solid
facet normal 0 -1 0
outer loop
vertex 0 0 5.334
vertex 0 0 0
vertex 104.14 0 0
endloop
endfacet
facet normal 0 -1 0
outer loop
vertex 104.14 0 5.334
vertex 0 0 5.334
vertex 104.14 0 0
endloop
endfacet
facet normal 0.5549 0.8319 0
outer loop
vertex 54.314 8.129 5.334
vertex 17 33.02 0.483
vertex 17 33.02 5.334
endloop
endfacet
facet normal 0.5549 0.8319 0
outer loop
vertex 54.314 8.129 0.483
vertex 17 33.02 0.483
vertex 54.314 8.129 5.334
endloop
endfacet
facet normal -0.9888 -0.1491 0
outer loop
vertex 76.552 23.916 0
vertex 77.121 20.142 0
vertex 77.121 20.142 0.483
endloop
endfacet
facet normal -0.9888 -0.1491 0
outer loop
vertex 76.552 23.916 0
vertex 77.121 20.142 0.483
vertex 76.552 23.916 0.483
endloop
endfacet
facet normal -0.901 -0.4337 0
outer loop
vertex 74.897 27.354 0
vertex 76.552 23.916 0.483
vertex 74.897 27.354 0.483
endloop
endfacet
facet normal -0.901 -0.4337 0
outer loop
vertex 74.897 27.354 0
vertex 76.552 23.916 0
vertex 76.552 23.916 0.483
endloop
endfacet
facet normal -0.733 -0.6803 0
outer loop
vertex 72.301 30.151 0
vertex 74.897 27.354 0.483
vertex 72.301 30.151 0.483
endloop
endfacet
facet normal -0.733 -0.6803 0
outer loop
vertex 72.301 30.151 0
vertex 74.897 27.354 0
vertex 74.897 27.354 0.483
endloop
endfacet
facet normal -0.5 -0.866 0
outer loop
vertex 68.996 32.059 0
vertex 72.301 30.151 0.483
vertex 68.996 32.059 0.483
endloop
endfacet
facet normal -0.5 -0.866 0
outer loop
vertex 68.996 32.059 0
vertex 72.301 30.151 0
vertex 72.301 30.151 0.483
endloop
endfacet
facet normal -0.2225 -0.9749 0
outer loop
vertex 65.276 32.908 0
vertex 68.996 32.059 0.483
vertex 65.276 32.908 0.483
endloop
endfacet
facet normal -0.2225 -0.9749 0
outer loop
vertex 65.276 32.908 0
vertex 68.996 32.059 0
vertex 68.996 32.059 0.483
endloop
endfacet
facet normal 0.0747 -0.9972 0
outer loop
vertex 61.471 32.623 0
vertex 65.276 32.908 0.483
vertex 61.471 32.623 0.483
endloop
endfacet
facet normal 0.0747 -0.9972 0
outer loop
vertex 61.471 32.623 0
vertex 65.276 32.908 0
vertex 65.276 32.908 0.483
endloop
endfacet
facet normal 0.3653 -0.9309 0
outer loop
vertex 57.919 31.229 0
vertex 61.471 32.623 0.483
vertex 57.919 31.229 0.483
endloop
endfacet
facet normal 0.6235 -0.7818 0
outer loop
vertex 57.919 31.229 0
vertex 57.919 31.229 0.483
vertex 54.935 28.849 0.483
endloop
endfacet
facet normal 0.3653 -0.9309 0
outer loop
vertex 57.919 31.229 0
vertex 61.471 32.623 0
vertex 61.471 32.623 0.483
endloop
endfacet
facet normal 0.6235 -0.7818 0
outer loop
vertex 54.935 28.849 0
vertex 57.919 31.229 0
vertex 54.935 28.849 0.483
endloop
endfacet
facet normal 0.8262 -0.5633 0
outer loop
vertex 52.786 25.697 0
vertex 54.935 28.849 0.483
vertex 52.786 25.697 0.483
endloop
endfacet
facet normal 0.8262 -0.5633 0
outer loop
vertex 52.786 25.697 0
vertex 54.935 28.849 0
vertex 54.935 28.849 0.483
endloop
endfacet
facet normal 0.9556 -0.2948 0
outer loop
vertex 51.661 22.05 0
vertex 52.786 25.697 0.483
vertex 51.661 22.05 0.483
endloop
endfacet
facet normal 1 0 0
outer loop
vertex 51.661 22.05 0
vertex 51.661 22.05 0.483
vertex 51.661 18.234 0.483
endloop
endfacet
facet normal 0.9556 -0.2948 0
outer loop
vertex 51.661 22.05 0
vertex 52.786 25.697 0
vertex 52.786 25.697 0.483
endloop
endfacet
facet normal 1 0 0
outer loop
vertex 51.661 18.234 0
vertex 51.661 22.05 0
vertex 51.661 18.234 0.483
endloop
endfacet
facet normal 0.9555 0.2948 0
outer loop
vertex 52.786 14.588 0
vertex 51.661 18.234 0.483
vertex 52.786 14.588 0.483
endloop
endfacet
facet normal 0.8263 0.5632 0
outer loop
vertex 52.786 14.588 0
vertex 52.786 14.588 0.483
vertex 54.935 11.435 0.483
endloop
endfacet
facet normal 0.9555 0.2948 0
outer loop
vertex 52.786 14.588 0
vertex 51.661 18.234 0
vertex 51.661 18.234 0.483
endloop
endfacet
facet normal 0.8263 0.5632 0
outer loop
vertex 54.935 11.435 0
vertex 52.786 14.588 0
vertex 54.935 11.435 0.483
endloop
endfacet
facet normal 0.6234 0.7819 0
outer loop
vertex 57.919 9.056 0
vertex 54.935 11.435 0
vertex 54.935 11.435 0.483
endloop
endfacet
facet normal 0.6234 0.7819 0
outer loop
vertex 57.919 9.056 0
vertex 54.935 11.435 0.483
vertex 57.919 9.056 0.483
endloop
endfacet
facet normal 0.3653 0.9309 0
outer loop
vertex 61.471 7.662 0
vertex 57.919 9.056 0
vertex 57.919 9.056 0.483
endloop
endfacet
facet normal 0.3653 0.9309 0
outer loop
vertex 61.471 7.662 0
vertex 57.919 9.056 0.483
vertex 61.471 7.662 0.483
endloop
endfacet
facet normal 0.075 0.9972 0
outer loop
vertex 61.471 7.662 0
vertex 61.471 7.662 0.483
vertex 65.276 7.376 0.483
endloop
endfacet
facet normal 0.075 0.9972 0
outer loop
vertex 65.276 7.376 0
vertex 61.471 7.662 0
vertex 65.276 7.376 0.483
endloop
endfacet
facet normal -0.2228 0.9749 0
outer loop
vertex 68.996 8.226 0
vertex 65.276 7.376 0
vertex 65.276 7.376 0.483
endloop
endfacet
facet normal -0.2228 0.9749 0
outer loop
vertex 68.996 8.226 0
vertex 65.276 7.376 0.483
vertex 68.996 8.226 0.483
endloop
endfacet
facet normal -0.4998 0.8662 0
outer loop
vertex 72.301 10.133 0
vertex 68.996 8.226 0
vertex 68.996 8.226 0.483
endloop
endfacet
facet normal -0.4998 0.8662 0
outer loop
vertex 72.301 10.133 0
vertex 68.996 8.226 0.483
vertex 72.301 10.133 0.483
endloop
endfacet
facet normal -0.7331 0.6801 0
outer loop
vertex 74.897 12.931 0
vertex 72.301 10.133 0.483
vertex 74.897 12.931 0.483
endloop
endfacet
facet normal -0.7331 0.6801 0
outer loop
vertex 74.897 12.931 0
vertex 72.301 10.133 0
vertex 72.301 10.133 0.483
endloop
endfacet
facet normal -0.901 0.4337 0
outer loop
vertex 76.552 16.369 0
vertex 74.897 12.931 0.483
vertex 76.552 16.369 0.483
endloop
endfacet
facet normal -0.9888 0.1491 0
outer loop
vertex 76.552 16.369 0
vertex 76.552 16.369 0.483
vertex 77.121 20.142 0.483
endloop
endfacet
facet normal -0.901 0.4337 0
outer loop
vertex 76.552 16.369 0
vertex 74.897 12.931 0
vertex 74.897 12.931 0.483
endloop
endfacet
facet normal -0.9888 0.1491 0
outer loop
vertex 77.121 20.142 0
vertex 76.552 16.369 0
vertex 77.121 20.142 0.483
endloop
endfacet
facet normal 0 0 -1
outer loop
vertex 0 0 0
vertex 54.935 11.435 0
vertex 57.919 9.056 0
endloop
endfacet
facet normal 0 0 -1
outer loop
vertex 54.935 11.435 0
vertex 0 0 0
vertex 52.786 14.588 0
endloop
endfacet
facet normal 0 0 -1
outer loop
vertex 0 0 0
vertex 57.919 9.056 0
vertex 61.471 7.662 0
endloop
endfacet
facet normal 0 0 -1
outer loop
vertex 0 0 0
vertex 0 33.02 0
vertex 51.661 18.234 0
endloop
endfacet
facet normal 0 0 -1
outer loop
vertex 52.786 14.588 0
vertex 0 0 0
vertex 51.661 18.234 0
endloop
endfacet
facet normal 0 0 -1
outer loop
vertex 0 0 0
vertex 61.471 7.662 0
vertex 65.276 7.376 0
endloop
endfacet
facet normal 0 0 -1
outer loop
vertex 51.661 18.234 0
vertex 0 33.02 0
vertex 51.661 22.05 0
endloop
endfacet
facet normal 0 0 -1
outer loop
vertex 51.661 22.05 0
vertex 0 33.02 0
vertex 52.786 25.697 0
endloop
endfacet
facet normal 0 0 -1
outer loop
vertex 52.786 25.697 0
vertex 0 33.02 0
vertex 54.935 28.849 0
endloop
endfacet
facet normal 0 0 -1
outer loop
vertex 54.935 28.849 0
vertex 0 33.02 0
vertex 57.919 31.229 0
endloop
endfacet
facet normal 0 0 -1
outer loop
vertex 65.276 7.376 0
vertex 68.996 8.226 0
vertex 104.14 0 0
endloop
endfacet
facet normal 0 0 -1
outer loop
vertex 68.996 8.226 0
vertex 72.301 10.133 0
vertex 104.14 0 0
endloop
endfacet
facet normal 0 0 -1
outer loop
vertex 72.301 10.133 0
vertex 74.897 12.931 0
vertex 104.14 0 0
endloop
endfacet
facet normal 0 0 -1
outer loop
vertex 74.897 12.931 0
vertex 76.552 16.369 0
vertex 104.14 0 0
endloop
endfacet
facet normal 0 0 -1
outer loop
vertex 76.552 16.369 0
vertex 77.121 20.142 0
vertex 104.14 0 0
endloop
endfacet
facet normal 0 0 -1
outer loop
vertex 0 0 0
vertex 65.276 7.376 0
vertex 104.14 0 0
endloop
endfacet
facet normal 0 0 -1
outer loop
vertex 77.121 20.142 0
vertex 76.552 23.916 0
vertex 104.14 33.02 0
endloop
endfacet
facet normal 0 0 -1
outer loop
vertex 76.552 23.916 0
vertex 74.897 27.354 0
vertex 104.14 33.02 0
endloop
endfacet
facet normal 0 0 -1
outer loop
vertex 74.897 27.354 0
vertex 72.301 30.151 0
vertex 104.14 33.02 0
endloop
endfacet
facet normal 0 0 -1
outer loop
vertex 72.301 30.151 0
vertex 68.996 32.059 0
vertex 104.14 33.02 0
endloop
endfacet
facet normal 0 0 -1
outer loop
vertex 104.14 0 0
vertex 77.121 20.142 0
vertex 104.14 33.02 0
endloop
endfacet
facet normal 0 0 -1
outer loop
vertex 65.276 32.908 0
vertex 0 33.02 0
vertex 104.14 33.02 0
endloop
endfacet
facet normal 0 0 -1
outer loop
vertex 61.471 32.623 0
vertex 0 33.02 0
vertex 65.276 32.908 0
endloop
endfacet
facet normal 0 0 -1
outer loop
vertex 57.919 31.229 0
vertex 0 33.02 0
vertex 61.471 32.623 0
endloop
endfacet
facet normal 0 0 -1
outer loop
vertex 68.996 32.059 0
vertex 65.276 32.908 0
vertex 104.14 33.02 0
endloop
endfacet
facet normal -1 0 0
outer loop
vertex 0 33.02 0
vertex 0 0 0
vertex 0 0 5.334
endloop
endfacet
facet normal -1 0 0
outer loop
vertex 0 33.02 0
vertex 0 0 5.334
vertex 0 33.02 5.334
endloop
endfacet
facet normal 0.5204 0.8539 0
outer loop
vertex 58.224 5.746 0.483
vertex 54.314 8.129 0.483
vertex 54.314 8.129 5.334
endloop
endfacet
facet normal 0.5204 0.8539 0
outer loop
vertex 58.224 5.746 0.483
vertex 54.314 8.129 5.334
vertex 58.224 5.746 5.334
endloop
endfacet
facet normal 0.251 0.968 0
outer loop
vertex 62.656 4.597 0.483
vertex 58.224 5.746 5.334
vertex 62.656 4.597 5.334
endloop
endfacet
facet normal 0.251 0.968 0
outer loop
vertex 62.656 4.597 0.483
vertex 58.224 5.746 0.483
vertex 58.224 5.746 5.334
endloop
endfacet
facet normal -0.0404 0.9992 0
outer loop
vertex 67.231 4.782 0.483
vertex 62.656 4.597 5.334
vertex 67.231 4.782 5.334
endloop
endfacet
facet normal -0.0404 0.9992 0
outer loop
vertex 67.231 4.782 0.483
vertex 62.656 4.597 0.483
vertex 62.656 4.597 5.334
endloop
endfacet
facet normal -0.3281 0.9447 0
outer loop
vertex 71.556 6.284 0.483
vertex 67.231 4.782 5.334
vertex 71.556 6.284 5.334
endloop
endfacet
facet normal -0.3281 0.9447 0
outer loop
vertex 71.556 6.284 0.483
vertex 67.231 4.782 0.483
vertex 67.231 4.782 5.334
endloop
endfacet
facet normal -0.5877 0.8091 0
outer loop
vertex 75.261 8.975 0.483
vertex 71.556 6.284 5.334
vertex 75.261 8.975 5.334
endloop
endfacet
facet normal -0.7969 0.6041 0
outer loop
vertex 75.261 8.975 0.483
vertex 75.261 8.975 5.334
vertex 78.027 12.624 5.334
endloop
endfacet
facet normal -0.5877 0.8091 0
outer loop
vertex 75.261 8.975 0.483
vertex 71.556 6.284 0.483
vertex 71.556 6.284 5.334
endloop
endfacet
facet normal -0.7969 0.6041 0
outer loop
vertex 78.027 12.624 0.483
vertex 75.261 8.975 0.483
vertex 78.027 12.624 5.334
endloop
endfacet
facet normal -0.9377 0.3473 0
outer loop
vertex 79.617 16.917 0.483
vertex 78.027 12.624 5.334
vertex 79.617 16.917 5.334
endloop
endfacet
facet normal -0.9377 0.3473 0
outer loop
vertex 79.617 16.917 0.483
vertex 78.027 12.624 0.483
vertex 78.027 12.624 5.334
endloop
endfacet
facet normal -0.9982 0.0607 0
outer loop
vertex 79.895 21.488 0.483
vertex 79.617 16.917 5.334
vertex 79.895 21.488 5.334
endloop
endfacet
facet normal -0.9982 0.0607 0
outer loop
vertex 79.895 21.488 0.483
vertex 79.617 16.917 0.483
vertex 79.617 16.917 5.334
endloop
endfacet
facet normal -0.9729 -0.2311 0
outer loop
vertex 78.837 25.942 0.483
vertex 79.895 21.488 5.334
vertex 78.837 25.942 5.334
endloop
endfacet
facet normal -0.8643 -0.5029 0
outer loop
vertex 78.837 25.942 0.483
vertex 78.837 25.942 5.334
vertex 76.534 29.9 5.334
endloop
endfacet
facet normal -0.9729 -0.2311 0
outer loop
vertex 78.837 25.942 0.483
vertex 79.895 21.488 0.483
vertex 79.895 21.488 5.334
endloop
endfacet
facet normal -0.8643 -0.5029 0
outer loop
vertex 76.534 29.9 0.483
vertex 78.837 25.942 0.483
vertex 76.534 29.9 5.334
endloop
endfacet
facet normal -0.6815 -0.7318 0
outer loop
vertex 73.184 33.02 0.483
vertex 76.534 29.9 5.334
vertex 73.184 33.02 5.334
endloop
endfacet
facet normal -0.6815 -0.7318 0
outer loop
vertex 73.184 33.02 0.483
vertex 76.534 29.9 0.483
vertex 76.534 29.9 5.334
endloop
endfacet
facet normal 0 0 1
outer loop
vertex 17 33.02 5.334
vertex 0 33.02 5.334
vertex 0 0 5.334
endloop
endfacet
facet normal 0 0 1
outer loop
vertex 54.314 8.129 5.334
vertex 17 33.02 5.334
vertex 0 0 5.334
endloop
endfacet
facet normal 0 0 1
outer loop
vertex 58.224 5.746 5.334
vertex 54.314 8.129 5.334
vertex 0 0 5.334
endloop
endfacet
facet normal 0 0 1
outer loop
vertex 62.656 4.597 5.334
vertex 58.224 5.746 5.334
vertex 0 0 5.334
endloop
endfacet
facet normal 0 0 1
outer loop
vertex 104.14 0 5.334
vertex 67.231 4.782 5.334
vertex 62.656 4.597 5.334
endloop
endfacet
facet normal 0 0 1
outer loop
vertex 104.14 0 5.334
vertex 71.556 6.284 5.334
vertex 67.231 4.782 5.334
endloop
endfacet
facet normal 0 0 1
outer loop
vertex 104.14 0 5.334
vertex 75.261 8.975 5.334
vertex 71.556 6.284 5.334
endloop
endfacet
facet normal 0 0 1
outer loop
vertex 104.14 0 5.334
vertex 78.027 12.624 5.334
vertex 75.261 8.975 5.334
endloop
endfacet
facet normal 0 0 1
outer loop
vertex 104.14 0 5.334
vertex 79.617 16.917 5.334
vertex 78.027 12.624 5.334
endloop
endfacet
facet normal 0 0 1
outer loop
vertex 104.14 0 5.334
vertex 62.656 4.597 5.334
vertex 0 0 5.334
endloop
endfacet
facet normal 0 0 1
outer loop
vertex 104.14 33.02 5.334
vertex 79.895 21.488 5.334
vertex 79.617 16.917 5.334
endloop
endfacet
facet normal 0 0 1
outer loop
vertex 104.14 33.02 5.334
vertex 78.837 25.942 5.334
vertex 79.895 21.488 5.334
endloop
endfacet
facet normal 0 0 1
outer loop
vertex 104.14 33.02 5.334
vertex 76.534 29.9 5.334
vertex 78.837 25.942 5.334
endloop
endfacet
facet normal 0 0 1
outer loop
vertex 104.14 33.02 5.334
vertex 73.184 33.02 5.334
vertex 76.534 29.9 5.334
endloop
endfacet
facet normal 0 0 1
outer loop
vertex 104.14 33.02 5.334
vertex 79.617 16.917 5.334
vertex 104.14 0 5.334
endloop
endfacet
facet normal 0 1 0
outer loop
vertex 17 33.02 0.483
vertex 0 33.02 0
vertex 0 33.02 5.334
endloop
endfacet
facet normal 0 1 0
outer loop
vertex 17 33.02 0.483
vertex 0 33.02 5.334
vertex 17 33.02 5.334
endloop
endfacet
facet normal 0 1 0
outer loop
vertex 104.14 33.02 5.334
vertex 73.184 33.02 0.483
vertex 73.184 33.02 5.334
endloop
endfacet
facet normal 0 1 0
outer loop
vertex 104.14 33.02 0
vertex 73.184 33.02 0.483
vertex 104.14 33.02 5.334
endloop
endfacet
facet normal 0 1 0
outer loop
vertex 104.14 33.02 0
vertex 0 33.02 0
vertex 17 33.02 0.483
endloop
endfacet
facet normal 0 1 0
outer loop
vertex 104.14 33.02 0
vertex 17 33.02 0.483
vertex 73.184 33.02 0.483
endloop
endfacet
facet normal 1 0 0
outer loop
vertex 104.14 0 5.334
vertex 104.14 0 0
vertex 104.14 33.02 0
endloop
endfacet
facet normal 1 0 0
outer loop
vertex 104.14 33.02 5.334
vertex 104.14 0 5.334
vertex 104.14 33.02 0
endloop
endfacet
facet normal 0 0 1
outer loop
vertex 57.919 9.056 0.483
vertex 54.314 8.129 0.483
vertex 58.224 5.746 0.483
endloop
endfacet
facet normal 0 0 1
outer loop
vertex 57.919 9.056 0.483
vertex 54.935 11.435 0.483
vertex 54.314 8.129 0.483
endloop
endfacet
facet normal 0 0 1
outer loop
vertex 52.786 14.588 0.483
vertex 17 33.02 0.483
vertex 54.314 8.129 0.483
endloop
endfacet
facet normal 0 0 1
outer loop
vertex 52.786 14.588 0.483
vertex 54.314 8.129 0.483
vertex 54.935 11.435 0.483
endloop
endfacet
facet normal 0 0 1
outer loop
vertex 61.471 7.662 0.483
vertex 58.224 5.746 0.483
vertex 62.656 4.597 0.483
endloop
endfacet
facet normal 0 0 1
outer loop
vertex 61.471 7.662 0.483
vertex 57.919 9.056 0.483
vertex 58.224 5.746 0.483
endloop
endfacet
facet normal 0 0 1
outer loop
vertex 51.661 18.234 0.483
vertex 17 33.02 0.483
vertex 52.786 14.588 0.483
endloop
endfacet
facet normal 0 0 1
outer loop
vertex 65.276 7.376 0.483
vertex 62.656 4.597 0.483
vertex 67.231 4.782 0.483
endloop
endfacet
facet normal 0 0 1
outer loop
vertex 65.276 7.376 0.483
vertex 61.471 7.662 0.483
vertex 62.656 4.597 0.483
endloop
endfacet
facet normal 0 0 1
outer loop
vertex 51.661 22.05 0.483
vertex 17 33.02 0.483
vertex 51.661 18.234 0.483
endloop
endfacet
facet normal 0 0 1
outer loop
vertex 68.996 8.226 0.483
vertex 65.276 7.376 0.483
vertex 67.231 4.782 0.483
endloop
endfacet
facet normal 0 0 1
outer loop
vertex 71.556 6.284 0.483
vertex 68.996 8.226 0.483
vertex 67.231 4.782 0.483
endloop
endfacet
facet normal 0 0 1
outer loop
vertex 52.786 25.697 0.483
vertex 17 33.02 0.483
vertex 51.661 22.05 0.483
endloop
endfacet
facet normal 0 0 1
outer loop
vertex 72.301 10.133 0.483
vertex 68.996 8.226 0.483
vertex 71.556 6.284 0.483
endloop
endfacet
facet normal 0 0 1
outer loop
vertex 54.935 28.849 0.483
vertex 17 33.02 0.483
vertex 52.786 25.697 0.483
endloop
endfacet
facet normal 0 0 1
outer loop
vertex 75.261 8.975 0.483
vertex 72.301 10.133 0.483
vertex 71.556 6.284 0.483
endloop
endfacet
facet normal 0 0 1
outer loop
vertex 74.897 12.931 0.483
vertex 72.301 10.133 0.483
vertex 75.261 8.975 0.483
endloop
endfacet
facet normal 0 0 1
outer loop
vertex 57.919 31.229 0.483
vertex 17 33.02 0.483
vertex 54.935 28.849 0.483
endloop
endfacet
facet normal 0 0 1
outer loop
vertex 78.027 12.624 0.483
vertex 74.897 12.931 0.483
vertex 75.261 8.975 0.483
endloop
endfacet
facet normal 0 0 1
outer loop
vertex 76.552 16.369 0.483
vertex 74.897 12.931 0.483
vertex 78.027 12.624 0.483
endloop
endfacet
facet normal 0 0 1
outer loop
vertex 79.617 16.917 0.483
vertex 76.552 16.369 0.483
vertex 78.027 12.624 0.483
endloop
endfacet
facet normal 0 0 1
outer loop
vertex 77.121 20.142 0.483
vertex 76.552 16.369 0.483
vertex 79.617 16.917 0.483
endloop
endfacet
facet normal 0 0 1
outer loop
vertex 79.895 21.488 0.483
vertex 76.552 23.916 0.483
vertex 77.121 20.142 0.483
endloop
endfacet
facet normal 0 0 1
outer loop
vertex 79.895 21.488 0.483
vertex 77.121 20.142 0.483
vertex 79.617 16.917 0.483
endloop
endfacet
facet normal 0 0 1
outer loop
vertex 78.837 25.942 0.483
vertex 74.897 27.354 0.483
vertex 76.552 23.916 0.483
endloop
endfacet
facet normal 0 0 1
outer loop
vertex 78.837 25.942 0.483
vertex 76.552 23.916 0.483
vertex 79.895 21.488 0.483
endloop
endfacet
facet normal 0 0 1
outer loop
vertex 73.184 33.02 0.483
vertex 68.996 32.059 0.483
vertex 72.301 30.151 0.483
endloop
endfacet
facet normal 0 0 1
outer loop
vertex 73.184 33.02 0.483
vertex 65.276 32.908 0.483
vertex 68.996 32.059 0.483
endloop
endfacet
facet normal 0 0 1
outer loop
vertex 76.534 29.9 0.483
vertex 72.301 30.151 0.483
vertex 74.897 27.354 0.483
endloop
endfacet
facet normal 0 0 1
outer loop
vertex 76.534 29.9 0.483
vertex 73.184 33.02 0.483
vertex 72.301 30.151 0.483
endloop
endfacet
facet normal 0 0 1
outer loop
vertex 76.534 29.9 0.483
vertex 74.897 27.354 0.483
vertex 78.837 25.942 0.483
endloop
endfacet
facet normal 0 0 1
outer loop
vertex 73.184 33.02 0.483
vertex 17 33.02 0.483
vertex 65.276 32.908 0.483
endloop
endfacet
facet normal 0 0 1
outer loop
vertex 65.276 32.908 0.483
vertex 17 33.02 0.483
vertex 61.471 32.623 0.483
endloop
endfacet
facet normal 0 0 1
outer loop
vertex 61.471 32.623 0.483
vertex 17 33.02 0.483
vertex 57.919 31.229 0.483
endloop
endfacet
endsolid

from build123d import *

# Parameters (mm, degrees)
SKETCH2_W           = 104.14
SKETCH2_H           = 33.02
BOSS_EXTRUDE1_DEPTH = 5.334
CAVITY1_START       = 0.4826
CAVITY1_DEPTH       = 4.8514
CAVITY1_2_OUTLINE_R = 12.8016
CAVITY1_2_DEPTH     = 0.4826


# Read off the part's stored shape, not the designer's step: Cavity1
with BuildPart() as part:
    # Sketch2 → Boss-Extrude1 (new body)
    with BuildSketch(Plane.XY):
        with Locations((52.07, 16.51)):
            Rectangle(SKETCH2_W, SKETCH2_H)
    extrude(amount=BOSS_EXTRUDE1_DEPTH)

    # Cavity1 outline → Cavity1 (cut)
    with BuildSketch(Plane.XY.offset(CAVITY1_START)):
        with BuildLine():
            Line((73.183671361, 33.02), (17.000497532, 33.02))
            Line((17.000497532, 33.02), (54.31426706, 8.129320565))
            ThreePointArc((54.31426706, 8.129320565), (76.777861535, 10.697572054), (73.183671361, 33.02))
        make_face()
    extrude(amount=CAVITY1_DEPTH, mode=Mode.SUBTRACT)

    # Cavity1 2 outline → Cavity1 2 (cut)
    with BuildSketch(Plane.XY):
        with Locations((64.319453414, 20.142181246)):
            Circle(CAVITY1_2_OUTLINE_R)
    extrude(amount=CAVITY1_2_DEPTH, mode=Mode.SUBTRACT)


solid = part.part
